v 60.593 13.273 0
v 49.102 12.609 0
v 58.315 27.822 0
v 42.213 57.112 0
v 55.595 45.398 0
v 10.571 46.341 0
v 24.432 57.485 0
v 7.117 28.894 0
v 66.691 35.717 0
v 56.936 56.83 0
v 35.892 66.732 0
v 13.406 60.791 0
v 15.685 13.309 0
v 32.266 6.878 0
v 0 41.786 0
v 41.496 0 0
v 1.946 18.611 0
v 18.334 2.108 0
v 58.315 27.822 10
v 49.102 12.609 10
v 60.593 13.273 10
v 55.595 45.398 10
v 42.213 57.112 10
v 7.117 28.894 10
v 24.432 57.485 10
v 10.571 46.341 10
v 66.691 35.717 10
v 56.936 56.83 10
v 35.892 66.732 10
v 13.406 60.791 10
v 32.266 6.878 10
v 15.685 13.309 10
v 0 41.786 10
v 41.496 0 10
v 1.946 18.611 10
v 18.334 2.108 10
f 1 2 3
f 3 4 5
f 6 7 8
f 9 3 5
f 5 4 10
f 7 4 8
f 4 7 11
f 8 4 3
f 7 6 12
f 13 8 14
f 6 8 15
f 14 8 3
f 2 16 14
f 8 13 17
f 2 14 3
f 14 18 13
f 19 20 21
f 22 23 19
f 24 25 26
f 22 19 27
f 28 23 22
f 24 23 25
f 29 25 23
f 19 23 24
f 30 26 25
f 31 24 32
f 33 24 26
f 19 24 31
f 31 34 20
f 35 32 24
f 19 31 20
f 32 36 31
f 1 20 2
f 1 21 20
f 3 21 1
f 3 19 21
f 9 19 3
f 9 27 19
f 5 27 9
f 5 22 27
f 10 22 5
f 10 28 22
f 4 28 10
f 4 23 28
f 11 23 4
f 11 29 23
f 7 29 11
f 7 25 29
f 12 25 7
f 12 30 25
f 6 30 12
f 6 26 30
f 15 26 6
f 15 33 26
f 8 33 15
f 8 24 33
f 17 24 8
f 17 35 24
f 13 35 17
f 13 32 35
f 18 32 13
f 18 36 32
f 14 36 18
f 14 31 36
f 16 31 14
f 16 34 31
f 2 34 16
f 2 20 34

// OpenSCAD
$fn = 32;

// ----------------------------------------------------------------------
// Chain sprocket: 9 teeth, 26 mm root radius
// ----------------------------------------------------------------------

// --- parameters (mm) ---
profile_height = 10;      // extrusion height
profile_points = 18;      // points of the closed outline

profile = [[58.315, 27.822], [66.691, 35.717], [55.595, 45.398], [56.936, 56.83], [42.213, 57.112], [35.892, 66.732], [24.432, 57.485], [13.406, 60.791], [10.571, 46.341], [0, 41.786], [7.117, 28.894], [1.946, 18.611], [15.685, 13.309], [18.334, 2.108], [32.266, 6.878], [41.496, 0], [49.102, 12.609], [60.593, 13.273]];  // single closed polygon, 18 points, counter clockwise

// --- the one profile operation ---
linear_extrude(height = profile_height) polygon(points = profile);
